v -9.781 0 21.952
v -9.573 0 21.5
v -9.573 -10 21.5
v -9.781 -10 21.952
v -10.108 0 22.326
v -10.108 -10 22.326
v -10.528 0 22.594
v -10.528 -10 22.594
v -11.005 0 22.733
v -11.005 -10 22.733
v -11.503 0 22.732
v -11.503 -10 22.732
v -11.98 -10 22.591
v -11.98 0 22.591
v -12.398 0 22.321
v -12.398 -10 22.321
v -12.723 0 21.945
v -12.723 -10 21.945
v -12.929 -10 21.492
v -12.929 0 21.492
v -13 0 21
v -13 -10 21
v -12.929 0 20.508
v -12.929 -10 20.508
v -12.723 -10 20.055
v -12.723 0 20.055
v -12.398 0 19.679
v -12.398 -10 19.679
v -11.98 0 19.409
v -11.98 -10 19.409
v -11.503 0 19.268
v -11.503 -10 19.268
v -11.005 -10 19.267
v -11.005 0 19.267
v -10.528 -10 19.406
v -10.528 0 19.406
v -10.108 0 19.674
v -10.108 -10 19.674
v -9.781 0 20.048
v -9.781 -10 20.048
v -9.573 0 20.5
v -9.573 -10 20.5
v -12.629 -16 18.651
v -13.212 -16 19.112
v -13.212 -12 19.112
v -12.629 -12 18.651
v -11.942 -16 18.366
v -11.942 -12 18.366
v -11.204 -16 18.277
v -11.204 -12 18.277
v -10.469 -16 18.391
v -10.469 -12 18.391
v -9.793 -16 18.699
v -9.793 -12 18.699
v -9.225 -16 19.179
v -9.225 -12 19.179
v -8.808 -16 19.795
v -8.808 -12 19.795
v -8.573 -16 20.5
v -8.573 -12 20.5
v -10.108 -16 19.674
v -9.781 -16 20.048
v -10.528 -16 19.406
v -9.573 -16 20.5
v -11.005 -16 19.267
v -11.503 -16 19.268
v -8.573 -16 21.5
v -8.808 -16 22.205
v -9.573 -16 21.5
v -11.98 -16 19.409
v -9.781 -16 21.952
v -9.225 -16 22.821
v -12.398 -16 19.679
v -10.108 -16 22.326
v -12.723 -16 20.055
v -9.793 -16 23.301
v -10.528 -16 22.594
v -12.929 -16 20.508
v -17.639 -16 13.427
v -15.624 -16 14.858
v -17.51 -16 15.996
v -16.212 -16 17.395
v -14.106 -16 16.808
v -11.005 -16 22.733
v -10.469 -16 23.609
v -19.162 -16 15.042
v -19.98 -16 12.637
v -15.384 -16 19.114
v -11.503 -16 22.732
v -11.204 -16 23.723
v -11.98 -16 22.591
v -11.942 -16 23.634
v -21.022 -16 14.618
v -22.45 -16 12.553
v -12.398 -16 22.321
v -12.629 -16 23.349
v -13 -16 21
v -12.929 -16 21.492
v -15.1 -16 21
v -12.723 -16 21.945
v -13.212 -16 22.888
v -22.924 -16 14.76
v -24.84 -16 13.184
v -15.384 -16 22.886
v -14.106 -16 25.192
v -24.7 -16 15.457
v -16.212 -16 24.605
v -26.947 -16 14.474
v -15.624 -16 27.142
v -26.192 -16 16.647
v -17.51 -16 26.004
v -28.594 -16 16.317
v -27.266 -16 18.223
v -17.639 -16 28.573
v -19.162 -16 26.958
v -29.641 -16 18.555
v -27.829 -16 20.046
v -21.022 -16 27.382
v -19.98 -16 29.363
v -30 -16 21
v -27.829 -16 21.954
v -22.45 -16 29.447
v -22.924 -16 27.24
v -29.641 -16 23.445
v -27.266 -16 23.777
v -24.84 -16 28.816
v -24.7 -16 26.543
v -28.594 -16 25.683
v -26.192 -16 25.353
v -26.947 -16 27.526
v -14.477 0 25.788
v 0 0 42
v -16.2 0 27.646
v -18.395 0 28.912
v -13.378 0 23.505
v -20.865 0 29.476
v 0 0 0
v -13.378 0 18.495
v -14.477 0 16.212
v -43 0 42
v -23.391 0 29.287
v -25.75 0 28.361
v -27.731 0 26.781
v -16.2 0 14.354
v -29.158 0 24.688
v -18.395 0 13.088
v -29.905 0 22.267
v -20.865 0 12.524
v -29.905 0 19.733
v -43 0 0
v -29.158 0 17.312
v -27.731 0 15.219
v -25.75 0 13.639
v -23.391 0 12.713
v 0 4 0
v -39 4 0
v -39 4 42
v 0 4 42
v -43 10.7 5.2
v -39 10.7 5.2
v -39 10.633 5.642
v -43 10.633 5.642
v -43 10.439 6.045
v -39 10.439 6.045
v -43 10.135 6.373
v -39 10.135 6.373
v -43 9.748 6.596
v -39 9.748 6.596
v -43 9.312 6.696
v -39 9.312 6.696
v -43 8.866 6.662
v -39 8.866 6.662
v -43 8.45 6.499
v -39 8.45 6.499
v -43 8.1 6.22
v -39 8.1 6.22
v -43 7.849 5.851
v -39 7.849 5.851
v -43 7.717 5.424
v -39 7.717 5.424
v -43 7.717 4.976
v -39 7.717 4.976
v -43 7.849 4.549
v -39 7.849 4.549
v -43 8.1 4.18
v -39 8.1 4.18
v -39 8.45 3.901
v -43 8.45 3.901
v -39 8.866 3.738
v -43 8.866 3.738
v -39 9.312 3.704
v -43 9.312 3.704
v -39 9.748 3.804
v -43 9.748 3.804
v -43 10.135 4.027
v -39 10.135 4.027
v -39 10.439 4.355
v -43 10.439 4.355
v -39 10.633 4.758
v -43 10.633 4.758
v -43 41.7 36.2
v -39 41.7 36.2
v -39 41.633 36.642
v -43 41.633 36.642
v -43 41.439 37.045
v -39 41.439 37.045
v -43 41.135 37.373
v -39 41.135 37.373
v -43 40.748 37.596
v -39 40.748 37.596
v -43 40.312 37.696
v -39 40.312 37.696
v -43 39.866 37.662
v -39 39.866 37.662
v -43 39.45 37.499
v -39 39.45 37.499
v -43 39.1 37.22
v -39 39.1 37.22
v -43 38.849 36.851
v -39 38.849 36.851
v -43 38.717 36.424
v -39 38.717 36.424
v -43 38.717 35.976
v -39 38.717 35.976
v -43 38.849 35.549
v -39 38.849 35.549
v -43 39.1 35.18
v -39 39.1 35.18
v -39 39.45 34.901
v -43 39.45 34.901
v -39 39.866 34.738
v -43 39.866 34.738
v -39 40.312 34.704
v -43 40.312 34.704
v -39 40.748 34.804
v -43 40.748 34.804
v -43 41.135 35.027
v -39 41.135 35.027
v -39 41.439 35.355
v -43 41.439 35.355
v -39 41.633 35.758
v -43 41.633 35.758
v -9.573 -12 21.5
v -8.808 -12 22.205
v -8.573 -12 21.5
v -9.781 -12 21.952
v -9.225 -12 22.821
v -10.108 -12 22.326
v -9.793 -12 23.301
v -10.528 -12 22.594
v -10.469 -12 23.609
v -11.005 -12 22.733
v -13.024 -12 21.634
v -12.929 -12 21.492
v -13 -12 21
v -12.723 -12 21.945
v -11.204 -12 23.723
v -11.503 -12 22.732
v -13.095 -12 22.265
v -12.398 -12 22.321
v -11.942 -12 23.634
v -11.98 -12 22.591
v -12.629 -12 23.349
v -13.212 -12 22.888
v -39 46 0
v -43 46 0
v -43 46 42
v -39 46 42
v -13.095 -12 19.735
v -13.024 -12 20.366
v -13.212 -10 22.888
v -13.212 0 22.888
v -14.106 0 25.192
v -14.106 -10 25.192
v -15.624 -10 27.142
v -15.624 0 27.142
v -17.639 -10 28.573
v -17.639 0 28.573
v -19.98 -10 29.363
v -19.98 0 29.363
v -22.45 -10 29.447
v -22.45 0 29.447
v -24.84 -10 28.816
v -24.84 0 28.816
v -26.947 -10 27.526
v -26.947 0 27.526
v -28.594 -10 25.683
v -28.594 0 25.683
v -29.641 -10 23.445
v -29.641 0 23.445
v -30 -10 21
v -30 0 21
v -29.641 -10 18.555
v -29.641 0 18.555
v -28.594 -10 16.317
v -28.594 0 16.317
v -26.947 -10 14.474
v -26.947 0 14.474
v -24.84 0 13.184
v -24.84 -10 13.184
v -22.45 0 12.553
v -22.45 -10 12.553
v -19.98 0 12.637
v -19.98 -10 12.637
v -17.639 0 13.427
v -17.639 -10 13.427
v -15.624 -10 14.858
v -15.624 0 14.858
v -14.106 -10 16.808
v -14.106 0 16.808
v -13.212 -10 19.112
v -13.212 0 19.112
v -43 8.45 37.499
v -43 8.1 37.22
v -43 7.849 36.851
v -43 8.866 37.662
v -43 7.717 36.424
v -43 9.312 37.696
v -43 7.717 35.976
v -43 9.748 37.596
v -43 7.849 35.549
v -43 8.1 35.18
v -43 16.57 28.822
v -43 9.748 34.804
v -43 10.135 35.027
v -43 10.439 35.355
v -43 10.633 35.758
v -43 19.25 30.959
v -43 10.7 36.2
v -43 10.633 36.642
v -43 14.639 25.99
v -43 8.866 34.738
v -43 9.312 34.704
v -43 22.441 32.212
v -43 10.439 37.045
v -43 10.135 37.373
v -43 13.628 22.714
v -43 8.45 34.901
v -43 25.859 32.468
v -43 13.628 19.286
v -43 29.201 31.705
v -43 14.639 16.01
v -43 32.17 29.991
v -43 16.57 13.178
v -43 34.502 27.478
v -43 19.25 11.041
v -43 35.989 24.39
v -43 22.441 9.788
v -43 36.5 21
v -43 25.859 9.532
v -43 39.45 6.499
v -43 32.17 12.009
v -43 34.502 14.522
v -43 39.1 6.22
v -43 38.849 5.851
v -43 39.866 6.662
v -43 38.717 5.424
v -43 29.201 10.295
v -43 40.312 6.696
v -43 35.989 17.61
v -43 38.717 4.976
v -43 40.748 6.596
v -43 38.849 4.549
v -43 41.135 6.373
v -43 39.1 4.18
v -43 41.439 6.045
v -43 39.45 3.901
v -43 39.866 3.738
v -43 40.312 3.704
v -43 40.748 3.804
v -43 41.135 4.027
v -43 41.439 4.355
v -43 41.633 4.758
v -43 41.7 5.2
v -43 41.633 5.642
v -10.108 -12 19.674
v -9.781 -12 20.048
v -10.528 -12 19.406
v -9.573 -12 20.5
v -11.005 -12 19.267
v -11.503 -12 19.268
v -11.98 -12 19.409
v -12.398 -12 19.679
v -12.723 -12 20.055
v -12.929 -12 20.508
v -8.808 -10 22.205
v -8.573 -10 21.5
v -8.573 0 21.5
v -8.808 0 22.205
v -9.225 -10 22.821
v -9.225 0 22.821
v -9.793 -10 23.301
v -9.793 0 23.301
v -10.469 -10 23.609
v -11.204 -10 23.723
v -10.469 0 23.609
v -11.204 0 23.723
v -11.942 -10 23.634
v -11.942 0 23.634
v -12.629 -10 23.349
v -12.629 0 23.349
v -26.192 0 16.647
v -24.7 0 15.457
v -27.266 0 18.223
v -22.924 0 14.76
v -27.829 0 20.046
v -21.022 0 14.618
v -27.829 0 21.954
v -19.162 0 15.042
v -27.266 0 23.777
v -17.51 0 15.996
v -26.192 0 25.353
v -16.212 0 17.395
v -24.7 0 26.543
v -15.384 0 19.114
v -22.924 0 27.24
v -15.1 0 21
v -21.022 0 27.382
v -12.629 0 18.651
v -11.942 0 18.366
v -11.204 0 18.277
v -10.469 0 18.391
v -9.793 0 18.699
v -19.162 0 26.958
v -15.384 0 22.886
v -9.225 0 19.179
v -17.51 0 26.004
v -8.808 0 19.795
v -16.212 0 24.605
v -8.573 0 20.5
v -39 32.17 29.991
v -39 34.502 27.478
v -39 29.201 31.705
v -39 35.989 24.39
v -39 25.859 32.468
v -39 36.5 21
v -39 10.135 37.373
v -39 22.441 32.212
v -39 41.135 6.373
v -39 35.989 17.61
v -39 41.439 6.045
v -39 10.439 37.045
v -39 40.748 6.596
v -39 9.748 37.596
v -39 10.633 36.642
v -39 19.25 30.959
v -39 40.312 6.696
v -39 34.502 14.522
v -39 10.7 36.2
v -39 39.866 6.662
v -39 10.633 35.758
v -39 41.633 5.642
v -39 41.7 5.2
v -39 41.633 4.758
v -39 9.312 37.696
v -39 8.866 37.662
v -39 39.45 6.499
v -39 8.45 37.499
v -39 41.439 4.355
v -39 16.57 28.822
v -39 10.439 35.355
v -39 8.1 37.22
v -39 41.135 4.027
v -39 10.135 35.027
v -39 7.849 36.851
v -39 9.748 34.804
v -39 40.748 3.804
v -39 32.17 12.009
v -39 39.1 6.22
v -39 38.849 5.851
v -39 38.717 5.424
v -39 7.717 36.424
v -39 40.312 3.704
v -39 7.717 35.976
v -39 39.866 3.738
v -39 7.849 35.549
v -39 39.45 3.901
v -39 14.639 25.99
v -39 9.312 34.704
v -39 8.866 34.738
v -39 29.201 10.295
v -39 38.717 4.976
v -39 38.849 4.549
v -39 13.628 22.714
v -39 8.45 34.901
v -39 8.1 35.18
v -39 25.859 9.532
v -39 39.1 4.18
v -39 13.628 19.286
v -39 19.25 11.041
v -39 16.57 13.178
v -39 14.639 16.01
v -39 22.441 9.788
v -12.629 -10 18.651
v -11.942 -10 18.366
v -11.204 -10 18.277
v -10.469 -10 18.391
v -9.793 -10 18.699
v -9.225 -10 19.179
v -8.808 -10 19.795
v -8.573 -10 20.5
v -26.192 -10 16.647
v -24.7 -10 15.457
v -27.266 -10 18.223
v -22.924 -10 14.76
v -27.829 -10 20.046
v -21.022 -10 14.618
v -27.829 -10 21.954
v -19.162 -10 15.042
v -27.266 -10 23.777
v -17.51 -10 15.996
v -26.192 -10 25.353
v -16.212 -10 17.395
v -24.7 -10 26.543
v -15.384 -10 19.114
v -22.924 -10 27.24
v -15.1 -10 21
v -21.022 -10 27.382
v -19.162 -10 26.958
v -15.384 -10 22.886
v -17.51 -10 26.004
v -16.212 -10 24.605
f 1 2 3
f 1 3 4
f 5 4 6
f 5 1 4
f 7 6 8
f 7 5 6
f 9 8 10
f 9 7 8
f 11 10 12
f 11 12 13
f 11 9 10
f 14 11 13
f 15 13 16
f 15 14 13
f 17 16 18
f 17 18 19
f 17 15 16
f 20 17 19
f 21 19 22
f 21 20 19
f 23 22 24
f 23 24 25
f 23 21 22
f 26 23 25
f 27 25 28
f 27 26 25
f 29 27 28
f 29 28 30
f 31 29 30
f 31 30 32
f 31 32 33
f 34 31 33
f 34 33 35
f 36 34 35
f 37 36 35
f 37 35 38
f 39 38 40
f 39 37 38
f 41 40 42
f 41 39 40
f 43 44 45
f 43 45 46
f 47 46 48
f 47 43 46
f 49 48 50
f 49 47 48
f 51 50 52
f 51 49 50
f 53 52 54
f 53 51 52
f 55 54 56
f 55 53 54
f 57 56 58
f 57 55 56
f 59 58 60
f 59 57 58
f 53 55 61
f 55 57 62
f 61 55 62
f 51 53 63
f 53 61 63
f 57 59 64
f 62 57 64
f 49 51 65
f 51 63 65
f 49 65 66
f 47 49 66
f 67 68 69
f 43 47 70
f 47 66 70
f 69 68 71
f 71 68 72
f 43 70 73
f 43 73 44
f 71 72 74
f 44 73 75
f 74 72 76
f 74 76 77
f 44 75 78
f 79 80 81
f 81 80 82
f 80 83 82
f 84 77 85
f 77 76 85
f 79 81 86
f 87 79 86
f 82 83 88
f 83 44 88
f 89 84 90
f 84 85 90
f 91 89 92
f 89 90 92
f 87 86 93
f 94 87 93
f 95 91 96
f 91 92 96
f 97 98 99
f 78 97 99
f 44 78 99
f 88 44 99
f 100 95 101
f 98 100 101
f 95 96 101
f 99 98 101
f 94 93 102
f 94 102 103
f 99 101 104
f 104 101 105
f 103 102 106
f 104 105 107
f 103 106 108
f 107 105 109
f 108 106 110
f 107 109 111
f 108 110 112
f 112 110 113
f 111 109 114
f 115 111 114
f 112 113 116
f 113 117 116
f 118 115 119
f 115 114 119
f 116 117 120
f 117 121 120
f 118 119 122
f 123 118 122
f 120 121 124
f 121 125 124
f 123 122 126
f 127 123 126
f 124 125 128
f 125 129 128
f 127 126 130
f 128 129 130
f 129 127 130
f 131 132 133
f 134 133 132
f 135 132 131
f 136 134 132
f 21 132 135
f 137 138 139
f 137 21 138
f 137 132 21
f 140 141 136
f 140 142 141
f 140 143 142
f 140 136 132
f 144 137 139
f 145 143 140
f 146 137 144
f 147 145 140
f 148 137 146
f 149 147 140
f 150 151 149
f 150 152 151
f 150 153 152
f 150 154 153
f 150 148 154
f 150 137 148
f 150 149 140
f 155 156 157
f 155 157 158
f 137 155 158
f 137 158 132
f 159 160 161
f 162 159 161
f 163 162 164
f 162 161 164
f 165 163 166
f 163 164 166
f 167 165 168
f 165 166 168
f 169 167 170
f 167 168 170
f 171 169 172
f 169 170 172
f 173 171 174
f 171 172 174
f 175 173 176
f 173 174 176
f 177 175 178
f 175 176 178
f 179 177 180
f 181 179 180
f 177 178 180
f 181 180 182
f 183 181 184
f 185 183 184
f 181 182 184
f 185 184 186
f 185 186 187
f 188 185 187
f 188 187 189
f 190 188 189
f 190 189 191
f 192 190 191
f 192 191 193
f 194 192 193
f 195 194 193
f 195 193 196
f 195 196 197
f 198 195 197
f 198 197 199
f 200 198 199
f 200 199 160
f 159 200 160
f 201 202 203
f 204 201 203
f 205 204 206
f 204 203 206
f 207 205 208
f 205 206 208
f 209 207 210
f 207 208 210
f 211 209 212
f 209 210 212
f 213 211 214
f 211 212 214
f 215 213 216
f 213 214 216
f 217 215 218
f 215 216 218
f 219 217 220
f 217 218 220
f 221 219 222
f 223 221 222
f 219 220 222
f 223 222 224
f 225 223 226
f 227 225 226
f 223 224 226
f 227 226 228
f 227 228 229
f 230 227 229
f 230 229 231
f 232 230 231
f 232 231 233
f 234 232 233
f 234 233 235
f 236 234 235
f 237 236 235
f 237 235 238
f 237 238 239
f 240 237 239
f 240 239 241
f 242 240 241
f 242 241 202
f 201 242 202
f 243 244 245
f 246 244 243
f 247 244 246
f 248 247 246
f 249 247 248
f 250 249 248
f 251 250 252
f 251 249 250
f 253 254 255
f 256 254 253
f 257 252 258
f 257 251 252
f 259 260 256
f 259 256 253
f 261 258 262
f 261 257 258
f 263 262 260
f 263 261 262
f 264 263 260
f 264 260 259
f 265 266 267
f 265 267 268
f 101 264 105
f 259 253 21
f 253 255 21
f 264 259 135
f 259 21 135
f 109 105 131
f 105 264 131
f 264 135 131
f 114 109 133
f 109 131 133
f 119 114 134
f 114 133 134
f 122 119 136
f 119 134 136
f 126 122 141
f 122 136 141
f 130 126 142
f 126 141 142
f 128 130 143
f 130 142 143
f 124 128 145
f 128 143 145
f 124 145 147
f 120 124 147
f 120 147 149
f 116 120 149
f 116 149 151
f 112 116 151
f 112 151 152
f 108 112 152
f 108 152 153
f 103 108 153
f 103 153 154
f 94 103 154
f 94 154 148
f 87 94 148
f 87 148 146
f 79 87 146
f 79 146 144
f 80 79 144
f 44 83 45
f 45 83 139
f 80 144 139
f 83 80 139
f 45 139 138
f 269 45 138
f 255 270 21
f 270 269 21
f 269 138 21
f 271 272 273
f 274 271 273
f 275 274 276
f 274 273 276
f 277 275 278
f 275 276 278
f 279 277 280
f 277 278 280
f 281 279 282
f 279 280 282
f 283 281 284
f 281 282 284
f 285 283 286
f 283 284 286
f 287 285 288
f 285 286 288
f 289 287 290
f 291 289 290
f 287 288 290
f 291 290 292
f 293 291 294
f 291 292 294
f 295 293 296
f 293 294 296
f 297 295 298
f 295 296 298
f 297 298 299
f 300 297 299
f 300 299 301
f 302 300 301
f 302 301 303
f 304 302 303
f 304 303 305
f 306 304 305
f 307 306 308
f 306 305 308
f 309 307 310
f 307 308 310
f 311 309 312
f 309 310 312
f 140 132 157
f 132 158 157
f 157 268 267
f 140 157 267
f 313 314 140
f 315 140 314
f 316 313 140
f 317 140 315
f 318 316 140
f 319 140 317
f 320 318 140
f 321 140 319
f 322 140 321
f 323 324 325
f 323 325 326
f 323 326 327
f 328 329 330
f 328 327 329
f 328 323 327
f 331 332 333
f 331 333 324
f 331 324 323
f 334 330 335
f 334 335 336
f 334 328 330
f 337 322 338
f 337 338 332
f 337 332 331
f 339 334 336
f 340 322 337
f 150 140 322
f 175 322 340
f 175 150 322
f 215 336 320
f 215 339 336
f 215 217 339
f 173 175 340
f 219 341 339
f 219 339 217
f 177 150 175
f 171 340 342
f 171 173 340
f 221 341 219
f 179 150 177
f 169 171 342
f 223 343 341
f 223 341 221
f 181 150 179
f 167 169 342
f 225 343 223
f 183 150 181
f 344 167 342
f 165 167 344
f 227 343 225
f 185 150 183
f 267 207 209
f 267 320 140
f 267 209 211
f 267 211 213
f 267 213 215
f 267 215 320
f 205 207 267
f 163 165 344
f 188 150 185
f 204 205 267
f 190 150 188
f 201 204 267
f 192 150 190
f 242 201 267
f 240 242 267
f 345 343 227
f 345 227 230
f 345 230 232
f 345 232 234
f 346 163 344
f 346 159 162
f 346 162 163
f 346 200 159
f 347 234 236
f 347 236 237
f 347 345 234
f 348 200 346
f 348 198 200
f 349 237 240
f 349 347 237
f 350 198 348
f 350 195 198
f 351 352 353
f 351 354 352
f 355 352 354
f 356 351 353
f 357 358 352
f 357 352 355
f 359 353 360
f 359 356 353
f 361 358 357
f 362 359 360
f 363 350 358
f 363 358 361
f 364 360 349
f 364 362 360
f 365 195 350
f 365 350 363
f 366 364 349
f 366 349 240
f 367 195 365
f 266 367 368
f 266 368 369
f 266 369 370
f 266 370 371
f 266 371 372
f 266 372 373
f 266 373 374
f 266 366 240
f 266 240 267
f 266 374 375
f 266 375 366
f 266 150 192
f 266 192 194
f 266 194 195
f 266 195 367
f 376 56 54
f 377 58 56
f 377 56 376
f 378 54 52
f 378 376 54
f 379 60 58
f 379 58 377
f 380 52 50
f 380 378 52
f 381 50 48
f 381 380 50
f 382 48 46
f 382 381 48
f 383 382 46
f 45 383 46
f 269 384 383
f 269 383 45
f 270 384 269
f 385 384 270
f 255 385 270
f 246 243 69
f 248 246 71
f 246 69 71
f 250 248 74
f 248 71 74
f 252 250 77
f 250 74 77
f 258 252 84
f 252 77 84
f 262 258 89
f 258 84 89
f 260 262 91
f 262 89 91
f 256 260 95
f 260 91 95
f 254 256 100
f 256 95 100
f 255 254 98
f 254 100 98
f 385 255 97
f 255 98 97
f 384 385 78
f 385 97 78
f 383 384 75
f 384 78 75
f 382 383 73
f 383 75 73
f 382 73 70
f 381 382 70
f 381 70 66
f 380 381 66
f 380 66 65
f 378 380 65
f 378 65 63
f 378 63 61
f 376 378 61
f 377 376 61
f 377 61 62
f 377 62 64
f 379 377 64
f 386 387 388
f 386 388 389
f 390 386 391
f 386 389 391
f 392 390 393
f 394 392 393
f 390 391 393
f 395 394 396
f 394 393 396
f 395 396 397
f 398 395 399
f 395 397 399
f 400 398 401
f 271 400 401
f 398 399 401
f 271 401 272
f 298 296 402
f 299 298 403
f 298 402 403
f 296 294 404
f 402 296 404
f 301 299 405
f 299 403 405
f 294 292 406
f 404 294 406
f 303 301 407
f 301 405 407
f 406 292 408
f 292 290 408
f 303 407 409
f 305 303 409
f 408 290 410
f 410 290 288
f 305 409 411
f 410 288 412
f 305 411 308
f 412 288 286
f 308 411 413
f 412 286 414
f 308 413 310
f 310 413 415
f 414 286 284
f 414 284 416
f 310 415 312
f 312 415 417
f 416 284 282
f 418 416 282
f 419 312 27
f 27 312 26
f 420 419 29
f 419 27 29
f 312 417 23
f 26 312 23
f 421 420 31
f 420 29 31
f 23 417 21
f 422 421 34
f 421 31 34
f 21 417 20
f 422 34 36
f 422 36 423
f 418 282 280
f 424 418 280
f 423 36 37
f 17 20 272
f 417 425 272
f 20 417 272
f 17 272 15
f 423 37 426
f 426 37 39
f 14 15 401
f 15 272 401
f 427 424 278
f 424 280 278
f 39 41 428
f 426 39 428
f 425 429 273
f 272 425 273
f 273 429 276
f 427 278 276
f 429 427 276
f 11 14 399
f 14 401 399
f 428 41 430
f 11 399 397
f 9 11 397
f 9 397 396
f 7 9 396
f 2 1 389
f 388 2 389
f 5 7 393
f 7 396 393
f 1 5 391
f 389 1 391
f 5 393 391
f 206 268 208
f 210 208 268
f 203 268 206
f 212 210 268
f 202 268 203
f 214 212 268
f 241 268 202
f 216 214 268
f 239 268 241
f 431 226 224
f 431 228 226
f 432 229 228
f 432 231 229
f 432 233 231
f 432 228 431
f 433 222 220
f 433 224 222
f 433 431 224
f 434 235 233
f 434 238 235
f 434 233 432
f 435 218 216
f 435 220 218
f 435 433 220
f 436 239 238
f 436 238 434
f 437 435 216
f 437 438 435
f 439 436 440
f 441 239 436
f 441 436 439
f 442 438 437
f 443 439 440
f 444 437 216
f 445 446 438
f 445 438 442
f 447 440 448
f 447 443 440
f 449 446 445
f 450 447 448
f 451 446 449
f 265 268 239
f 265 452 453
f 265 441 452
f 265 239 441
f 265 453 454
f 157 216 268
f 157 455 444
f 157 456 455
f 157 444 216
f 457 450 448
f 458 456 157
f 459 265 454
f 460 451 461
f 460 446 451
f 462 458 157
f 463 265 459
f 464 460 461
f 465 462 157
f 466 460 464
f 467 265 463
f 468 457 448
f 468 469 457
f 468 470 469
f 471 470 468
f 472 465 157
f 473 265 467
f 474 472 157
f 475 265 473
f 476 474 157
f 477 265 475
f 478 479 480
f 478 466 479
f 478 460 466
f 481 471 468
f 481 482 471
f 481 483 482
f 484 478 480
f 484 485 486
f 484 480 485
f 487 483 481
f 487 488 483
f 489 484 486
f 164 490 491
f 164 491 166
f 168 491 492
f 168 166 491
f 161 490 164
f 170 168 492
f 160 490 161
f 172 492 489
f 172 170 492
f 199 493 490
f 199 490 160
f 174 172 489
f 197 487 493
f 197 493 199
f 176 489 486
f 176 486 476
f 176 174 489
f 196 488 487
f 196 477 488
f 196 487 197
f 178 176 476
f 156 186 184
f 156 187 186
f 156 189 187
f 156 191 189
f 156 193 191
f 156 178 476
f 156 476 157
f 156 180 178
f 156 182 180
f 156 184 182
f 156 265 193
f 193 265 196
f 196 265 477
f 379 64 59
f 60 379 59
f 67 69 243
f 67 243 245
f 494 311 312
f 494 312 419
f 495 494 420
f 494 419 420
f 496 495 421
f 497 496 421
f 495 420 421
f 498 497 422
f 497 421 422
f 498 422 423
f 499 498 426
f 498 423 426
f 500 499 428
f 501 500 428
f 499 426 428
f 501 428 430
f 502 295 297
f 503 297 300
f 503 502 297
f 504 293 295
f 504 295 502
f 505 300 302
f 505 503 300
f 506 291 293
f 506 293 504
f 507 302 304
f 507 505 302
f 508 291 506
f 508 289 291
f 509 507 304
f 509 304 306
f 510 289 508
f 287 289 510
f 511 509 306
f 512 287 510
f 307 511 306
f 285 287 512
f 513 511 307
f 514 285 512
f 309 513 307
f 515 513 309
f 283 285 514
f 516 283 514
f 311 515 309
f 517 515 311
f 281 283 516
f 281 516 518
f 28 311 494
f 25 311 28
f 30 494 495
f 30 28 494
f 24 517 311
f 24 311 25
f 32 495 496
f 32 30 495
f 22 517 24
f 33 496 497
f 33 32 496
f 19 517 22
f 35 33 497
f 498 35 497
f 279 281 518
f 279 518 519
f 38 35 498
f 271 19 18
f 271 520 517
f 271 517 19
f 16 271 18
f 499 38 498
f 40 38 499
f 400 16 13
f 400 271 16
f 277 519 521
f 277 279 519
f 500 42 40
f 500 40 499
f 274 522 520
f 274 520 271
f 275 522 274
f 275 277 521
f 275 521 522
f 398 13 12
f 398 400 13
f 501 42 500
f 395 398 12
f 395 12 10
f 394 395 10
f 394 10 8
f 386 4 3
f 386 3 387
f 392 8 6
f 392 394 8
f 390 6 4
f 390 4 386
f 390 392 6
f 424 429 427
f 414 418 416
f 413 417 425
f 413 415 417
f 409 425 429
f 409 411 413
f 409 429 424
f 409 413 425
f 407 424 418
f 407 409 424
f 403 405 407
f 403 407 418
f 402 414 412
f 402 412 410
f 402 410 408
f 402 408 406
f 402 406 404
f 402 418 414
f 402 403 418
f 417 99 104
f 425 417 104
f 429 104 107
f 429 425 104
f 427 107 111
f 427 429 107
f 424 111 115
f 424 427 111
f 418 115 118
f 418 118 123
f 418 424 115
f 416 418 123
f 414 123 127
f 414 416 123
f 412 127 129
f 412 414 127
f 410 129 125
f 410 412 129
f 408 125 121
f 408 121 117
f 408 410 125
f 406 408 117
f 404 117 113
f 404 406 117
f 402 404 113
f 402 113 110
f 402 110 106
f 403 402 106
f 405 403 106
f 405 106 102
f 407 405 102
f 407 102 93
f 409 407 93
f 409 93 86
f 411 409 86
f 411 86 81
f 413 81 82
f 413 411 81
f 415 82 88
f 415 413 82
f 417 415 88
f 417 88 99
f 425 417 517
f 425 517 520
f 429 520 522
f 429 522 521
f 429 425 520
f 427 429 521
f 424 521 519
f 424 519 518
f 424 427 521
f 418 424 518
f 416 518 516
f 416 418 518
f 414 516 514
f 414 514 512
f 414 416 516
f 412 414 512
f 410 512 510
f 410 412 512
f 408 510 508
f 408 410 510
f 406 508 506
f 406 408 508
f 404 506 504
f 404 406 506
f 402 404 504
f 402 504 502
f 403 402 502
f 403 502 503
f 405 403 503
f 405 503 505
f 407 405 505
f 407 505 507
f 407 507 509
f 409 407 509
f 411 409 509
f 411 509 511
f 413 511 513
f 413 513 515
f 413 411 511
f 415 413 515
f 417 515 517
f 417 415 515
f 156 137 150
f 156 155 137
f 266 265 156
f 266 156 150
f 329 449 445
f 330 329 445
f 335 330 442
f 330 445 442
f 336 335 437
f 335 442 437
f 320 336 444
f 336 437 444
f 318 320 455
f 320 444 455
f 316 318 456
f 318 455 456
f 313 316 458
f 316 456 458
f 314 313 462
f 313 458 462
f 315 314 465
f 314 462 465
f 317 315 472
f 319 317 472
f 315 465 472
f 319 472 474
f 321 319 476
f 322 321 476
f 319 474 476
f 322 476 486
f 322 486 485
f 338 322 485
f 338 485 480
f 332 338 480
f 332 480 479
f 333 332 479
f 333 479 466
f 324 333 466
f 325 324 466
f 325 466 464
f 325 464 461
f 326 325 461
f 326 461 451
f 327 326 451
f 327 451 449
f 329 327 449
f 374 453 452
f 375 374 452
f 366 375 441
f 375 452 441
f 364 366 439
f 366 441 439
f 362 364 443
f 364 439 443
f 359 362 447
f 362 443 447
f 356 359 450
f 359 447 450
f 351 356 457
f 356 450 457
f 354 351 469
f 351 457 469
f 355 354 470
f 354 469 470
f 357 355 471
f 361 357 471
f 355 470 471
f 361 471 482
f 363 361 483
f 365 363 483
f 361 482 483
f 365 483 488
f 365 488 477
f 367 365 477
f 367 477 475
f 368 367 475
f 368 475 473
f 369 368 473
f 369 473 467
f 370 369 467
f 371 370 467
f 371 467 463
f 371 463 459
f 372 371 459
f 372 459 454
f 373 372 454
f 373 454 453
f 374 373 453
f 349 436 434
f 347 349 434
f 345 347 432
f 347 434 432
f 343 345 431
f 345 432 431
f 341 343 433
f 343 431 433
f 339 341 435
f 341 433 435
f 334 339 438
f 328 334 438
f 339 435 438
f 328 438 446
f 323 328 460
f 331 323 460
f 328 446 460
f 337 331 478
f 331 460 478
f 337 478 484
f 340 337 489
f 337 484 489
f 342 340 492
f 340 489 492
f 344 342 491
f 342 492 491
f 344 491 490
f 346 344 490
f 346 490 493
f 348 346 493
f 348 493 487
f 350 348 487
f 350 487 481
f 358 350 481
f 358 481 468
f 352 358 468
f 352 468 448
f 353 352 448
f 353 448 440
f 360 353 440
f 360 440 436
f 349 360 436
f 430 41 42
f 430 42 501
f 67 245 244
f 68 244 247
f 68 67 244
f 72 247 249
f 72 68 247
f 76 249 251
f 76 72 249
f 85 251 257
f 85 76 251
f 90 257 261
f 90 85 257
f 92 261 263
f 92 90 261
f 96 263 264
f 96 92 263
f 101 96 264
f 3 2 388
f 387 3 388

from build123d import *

# Parameters (mm, degrees)
PAD_DEPTH     = 42
SKETCH001_R   = 1.5
SKETCH001_R_2 = 11.5
POCKET_DEPTH  = 4.001
SKETCH002_R   = 8.5
SKETCH002_R_2 = 6.4
PAD001_DEPTH  = 16
PAD002_DEPTH  = 4
SKETCH004_R   = 6.4
PAD003_DEPTH  = 10


with BuildPart() as body:
    # Sketch → Pad (new body)
    with BuildSketch(Plane.XY):
        Polygon((0, 0), (-43, 0), (-43, 46), (-39, 46), (-39, 4), (0, 4), align=None)
    extrude(amount=PAD_DEPTH)

    # Sketch001 (on Face4 of Pad) → Pocket (cut, through all)
    with BuildSketch(Plane.YZ.offset(-39)):
        with Locations((9.2, 36.2)):
            Circle(SKETCH001_R)
        with Locations((40.2, 36.2)):
            Circle(SKETCH001_R)
        with Locations((9.2, 5.2)):
            Circle(SKETCH001_R)
        with Locations((40.2, 5.2)):
            Circle(SKETCH001_R)
        with Locations((25, 21)):
            Circle(SKETCH001_R_2)
    extrude(amount=-POCKET_DEPTH, mode=Mode.SUBTRACT)

    # Sketch002 (on Face1 of Pocket) → Pad001 (join)
    with BuildSketch(Plane.XZ):
        with Locations((-21.5, 21)):
            Circle(SKETCH002_R)
        with Locations((-21.5, 21)):
            Circle(SKETCH002_R_2, mode=Mode.SUBTRACT)
    extrude(amount=PAD001_DEPTH)

    # Sketch003 (on Face15 of Pad001) → Pad002 (join)
    with BuildSketch(Plane.XZ.offset(16)):
        with BuildLine():
            ThreePointArc((-9.572949, 21.5), (-13, 21), (-9.572949, 20.5))
            Line((-9.572949, 20.5), (-8.572949, 20.5))
            ThreePointArc((-8.572949, 21.5), (-13.973344, 21), (-8.572949, 20.5))
            Line((-9.572949, 21.5), (-8.572949, 21.5))
        make_face()
    extrude(amount=-PAD002_DEPTH)


with BuildPart() as body001:
    # Sketch004 → Pad003 (new body)
    with BuildSketch(Plane.XZ):
        with BuildLine():
            ThreePointArc((-13.212395, 22.888281), (-30, 21), (-13.212395, 19.111719))
            ThreePointArc((-13.212395, 19.111719), (-10.469286, 18.39096), (-8.572949, 20.5))
            Line((-9.572949, 20.5), (-8.572949, 20.5))
            ThreePointArc((-9.572949, 21.5), (-13, 21), (-9.572949, 20.5))
            Line((-9.572949, 21.5), (-8.572949, 21.5))
            ThreePointArc((-8.572949, 21.5), (-10.469286, 23.60904), (-13.212395, 22.888281))
        make_face()
        with Locations((-21.5, 21)):
            Circle(SKETCH004_R, mode=Mode.SUBTRACT)
    extrude(amount=PAD003_DEPTH)


solid = Compound([body.part, body001.part])
